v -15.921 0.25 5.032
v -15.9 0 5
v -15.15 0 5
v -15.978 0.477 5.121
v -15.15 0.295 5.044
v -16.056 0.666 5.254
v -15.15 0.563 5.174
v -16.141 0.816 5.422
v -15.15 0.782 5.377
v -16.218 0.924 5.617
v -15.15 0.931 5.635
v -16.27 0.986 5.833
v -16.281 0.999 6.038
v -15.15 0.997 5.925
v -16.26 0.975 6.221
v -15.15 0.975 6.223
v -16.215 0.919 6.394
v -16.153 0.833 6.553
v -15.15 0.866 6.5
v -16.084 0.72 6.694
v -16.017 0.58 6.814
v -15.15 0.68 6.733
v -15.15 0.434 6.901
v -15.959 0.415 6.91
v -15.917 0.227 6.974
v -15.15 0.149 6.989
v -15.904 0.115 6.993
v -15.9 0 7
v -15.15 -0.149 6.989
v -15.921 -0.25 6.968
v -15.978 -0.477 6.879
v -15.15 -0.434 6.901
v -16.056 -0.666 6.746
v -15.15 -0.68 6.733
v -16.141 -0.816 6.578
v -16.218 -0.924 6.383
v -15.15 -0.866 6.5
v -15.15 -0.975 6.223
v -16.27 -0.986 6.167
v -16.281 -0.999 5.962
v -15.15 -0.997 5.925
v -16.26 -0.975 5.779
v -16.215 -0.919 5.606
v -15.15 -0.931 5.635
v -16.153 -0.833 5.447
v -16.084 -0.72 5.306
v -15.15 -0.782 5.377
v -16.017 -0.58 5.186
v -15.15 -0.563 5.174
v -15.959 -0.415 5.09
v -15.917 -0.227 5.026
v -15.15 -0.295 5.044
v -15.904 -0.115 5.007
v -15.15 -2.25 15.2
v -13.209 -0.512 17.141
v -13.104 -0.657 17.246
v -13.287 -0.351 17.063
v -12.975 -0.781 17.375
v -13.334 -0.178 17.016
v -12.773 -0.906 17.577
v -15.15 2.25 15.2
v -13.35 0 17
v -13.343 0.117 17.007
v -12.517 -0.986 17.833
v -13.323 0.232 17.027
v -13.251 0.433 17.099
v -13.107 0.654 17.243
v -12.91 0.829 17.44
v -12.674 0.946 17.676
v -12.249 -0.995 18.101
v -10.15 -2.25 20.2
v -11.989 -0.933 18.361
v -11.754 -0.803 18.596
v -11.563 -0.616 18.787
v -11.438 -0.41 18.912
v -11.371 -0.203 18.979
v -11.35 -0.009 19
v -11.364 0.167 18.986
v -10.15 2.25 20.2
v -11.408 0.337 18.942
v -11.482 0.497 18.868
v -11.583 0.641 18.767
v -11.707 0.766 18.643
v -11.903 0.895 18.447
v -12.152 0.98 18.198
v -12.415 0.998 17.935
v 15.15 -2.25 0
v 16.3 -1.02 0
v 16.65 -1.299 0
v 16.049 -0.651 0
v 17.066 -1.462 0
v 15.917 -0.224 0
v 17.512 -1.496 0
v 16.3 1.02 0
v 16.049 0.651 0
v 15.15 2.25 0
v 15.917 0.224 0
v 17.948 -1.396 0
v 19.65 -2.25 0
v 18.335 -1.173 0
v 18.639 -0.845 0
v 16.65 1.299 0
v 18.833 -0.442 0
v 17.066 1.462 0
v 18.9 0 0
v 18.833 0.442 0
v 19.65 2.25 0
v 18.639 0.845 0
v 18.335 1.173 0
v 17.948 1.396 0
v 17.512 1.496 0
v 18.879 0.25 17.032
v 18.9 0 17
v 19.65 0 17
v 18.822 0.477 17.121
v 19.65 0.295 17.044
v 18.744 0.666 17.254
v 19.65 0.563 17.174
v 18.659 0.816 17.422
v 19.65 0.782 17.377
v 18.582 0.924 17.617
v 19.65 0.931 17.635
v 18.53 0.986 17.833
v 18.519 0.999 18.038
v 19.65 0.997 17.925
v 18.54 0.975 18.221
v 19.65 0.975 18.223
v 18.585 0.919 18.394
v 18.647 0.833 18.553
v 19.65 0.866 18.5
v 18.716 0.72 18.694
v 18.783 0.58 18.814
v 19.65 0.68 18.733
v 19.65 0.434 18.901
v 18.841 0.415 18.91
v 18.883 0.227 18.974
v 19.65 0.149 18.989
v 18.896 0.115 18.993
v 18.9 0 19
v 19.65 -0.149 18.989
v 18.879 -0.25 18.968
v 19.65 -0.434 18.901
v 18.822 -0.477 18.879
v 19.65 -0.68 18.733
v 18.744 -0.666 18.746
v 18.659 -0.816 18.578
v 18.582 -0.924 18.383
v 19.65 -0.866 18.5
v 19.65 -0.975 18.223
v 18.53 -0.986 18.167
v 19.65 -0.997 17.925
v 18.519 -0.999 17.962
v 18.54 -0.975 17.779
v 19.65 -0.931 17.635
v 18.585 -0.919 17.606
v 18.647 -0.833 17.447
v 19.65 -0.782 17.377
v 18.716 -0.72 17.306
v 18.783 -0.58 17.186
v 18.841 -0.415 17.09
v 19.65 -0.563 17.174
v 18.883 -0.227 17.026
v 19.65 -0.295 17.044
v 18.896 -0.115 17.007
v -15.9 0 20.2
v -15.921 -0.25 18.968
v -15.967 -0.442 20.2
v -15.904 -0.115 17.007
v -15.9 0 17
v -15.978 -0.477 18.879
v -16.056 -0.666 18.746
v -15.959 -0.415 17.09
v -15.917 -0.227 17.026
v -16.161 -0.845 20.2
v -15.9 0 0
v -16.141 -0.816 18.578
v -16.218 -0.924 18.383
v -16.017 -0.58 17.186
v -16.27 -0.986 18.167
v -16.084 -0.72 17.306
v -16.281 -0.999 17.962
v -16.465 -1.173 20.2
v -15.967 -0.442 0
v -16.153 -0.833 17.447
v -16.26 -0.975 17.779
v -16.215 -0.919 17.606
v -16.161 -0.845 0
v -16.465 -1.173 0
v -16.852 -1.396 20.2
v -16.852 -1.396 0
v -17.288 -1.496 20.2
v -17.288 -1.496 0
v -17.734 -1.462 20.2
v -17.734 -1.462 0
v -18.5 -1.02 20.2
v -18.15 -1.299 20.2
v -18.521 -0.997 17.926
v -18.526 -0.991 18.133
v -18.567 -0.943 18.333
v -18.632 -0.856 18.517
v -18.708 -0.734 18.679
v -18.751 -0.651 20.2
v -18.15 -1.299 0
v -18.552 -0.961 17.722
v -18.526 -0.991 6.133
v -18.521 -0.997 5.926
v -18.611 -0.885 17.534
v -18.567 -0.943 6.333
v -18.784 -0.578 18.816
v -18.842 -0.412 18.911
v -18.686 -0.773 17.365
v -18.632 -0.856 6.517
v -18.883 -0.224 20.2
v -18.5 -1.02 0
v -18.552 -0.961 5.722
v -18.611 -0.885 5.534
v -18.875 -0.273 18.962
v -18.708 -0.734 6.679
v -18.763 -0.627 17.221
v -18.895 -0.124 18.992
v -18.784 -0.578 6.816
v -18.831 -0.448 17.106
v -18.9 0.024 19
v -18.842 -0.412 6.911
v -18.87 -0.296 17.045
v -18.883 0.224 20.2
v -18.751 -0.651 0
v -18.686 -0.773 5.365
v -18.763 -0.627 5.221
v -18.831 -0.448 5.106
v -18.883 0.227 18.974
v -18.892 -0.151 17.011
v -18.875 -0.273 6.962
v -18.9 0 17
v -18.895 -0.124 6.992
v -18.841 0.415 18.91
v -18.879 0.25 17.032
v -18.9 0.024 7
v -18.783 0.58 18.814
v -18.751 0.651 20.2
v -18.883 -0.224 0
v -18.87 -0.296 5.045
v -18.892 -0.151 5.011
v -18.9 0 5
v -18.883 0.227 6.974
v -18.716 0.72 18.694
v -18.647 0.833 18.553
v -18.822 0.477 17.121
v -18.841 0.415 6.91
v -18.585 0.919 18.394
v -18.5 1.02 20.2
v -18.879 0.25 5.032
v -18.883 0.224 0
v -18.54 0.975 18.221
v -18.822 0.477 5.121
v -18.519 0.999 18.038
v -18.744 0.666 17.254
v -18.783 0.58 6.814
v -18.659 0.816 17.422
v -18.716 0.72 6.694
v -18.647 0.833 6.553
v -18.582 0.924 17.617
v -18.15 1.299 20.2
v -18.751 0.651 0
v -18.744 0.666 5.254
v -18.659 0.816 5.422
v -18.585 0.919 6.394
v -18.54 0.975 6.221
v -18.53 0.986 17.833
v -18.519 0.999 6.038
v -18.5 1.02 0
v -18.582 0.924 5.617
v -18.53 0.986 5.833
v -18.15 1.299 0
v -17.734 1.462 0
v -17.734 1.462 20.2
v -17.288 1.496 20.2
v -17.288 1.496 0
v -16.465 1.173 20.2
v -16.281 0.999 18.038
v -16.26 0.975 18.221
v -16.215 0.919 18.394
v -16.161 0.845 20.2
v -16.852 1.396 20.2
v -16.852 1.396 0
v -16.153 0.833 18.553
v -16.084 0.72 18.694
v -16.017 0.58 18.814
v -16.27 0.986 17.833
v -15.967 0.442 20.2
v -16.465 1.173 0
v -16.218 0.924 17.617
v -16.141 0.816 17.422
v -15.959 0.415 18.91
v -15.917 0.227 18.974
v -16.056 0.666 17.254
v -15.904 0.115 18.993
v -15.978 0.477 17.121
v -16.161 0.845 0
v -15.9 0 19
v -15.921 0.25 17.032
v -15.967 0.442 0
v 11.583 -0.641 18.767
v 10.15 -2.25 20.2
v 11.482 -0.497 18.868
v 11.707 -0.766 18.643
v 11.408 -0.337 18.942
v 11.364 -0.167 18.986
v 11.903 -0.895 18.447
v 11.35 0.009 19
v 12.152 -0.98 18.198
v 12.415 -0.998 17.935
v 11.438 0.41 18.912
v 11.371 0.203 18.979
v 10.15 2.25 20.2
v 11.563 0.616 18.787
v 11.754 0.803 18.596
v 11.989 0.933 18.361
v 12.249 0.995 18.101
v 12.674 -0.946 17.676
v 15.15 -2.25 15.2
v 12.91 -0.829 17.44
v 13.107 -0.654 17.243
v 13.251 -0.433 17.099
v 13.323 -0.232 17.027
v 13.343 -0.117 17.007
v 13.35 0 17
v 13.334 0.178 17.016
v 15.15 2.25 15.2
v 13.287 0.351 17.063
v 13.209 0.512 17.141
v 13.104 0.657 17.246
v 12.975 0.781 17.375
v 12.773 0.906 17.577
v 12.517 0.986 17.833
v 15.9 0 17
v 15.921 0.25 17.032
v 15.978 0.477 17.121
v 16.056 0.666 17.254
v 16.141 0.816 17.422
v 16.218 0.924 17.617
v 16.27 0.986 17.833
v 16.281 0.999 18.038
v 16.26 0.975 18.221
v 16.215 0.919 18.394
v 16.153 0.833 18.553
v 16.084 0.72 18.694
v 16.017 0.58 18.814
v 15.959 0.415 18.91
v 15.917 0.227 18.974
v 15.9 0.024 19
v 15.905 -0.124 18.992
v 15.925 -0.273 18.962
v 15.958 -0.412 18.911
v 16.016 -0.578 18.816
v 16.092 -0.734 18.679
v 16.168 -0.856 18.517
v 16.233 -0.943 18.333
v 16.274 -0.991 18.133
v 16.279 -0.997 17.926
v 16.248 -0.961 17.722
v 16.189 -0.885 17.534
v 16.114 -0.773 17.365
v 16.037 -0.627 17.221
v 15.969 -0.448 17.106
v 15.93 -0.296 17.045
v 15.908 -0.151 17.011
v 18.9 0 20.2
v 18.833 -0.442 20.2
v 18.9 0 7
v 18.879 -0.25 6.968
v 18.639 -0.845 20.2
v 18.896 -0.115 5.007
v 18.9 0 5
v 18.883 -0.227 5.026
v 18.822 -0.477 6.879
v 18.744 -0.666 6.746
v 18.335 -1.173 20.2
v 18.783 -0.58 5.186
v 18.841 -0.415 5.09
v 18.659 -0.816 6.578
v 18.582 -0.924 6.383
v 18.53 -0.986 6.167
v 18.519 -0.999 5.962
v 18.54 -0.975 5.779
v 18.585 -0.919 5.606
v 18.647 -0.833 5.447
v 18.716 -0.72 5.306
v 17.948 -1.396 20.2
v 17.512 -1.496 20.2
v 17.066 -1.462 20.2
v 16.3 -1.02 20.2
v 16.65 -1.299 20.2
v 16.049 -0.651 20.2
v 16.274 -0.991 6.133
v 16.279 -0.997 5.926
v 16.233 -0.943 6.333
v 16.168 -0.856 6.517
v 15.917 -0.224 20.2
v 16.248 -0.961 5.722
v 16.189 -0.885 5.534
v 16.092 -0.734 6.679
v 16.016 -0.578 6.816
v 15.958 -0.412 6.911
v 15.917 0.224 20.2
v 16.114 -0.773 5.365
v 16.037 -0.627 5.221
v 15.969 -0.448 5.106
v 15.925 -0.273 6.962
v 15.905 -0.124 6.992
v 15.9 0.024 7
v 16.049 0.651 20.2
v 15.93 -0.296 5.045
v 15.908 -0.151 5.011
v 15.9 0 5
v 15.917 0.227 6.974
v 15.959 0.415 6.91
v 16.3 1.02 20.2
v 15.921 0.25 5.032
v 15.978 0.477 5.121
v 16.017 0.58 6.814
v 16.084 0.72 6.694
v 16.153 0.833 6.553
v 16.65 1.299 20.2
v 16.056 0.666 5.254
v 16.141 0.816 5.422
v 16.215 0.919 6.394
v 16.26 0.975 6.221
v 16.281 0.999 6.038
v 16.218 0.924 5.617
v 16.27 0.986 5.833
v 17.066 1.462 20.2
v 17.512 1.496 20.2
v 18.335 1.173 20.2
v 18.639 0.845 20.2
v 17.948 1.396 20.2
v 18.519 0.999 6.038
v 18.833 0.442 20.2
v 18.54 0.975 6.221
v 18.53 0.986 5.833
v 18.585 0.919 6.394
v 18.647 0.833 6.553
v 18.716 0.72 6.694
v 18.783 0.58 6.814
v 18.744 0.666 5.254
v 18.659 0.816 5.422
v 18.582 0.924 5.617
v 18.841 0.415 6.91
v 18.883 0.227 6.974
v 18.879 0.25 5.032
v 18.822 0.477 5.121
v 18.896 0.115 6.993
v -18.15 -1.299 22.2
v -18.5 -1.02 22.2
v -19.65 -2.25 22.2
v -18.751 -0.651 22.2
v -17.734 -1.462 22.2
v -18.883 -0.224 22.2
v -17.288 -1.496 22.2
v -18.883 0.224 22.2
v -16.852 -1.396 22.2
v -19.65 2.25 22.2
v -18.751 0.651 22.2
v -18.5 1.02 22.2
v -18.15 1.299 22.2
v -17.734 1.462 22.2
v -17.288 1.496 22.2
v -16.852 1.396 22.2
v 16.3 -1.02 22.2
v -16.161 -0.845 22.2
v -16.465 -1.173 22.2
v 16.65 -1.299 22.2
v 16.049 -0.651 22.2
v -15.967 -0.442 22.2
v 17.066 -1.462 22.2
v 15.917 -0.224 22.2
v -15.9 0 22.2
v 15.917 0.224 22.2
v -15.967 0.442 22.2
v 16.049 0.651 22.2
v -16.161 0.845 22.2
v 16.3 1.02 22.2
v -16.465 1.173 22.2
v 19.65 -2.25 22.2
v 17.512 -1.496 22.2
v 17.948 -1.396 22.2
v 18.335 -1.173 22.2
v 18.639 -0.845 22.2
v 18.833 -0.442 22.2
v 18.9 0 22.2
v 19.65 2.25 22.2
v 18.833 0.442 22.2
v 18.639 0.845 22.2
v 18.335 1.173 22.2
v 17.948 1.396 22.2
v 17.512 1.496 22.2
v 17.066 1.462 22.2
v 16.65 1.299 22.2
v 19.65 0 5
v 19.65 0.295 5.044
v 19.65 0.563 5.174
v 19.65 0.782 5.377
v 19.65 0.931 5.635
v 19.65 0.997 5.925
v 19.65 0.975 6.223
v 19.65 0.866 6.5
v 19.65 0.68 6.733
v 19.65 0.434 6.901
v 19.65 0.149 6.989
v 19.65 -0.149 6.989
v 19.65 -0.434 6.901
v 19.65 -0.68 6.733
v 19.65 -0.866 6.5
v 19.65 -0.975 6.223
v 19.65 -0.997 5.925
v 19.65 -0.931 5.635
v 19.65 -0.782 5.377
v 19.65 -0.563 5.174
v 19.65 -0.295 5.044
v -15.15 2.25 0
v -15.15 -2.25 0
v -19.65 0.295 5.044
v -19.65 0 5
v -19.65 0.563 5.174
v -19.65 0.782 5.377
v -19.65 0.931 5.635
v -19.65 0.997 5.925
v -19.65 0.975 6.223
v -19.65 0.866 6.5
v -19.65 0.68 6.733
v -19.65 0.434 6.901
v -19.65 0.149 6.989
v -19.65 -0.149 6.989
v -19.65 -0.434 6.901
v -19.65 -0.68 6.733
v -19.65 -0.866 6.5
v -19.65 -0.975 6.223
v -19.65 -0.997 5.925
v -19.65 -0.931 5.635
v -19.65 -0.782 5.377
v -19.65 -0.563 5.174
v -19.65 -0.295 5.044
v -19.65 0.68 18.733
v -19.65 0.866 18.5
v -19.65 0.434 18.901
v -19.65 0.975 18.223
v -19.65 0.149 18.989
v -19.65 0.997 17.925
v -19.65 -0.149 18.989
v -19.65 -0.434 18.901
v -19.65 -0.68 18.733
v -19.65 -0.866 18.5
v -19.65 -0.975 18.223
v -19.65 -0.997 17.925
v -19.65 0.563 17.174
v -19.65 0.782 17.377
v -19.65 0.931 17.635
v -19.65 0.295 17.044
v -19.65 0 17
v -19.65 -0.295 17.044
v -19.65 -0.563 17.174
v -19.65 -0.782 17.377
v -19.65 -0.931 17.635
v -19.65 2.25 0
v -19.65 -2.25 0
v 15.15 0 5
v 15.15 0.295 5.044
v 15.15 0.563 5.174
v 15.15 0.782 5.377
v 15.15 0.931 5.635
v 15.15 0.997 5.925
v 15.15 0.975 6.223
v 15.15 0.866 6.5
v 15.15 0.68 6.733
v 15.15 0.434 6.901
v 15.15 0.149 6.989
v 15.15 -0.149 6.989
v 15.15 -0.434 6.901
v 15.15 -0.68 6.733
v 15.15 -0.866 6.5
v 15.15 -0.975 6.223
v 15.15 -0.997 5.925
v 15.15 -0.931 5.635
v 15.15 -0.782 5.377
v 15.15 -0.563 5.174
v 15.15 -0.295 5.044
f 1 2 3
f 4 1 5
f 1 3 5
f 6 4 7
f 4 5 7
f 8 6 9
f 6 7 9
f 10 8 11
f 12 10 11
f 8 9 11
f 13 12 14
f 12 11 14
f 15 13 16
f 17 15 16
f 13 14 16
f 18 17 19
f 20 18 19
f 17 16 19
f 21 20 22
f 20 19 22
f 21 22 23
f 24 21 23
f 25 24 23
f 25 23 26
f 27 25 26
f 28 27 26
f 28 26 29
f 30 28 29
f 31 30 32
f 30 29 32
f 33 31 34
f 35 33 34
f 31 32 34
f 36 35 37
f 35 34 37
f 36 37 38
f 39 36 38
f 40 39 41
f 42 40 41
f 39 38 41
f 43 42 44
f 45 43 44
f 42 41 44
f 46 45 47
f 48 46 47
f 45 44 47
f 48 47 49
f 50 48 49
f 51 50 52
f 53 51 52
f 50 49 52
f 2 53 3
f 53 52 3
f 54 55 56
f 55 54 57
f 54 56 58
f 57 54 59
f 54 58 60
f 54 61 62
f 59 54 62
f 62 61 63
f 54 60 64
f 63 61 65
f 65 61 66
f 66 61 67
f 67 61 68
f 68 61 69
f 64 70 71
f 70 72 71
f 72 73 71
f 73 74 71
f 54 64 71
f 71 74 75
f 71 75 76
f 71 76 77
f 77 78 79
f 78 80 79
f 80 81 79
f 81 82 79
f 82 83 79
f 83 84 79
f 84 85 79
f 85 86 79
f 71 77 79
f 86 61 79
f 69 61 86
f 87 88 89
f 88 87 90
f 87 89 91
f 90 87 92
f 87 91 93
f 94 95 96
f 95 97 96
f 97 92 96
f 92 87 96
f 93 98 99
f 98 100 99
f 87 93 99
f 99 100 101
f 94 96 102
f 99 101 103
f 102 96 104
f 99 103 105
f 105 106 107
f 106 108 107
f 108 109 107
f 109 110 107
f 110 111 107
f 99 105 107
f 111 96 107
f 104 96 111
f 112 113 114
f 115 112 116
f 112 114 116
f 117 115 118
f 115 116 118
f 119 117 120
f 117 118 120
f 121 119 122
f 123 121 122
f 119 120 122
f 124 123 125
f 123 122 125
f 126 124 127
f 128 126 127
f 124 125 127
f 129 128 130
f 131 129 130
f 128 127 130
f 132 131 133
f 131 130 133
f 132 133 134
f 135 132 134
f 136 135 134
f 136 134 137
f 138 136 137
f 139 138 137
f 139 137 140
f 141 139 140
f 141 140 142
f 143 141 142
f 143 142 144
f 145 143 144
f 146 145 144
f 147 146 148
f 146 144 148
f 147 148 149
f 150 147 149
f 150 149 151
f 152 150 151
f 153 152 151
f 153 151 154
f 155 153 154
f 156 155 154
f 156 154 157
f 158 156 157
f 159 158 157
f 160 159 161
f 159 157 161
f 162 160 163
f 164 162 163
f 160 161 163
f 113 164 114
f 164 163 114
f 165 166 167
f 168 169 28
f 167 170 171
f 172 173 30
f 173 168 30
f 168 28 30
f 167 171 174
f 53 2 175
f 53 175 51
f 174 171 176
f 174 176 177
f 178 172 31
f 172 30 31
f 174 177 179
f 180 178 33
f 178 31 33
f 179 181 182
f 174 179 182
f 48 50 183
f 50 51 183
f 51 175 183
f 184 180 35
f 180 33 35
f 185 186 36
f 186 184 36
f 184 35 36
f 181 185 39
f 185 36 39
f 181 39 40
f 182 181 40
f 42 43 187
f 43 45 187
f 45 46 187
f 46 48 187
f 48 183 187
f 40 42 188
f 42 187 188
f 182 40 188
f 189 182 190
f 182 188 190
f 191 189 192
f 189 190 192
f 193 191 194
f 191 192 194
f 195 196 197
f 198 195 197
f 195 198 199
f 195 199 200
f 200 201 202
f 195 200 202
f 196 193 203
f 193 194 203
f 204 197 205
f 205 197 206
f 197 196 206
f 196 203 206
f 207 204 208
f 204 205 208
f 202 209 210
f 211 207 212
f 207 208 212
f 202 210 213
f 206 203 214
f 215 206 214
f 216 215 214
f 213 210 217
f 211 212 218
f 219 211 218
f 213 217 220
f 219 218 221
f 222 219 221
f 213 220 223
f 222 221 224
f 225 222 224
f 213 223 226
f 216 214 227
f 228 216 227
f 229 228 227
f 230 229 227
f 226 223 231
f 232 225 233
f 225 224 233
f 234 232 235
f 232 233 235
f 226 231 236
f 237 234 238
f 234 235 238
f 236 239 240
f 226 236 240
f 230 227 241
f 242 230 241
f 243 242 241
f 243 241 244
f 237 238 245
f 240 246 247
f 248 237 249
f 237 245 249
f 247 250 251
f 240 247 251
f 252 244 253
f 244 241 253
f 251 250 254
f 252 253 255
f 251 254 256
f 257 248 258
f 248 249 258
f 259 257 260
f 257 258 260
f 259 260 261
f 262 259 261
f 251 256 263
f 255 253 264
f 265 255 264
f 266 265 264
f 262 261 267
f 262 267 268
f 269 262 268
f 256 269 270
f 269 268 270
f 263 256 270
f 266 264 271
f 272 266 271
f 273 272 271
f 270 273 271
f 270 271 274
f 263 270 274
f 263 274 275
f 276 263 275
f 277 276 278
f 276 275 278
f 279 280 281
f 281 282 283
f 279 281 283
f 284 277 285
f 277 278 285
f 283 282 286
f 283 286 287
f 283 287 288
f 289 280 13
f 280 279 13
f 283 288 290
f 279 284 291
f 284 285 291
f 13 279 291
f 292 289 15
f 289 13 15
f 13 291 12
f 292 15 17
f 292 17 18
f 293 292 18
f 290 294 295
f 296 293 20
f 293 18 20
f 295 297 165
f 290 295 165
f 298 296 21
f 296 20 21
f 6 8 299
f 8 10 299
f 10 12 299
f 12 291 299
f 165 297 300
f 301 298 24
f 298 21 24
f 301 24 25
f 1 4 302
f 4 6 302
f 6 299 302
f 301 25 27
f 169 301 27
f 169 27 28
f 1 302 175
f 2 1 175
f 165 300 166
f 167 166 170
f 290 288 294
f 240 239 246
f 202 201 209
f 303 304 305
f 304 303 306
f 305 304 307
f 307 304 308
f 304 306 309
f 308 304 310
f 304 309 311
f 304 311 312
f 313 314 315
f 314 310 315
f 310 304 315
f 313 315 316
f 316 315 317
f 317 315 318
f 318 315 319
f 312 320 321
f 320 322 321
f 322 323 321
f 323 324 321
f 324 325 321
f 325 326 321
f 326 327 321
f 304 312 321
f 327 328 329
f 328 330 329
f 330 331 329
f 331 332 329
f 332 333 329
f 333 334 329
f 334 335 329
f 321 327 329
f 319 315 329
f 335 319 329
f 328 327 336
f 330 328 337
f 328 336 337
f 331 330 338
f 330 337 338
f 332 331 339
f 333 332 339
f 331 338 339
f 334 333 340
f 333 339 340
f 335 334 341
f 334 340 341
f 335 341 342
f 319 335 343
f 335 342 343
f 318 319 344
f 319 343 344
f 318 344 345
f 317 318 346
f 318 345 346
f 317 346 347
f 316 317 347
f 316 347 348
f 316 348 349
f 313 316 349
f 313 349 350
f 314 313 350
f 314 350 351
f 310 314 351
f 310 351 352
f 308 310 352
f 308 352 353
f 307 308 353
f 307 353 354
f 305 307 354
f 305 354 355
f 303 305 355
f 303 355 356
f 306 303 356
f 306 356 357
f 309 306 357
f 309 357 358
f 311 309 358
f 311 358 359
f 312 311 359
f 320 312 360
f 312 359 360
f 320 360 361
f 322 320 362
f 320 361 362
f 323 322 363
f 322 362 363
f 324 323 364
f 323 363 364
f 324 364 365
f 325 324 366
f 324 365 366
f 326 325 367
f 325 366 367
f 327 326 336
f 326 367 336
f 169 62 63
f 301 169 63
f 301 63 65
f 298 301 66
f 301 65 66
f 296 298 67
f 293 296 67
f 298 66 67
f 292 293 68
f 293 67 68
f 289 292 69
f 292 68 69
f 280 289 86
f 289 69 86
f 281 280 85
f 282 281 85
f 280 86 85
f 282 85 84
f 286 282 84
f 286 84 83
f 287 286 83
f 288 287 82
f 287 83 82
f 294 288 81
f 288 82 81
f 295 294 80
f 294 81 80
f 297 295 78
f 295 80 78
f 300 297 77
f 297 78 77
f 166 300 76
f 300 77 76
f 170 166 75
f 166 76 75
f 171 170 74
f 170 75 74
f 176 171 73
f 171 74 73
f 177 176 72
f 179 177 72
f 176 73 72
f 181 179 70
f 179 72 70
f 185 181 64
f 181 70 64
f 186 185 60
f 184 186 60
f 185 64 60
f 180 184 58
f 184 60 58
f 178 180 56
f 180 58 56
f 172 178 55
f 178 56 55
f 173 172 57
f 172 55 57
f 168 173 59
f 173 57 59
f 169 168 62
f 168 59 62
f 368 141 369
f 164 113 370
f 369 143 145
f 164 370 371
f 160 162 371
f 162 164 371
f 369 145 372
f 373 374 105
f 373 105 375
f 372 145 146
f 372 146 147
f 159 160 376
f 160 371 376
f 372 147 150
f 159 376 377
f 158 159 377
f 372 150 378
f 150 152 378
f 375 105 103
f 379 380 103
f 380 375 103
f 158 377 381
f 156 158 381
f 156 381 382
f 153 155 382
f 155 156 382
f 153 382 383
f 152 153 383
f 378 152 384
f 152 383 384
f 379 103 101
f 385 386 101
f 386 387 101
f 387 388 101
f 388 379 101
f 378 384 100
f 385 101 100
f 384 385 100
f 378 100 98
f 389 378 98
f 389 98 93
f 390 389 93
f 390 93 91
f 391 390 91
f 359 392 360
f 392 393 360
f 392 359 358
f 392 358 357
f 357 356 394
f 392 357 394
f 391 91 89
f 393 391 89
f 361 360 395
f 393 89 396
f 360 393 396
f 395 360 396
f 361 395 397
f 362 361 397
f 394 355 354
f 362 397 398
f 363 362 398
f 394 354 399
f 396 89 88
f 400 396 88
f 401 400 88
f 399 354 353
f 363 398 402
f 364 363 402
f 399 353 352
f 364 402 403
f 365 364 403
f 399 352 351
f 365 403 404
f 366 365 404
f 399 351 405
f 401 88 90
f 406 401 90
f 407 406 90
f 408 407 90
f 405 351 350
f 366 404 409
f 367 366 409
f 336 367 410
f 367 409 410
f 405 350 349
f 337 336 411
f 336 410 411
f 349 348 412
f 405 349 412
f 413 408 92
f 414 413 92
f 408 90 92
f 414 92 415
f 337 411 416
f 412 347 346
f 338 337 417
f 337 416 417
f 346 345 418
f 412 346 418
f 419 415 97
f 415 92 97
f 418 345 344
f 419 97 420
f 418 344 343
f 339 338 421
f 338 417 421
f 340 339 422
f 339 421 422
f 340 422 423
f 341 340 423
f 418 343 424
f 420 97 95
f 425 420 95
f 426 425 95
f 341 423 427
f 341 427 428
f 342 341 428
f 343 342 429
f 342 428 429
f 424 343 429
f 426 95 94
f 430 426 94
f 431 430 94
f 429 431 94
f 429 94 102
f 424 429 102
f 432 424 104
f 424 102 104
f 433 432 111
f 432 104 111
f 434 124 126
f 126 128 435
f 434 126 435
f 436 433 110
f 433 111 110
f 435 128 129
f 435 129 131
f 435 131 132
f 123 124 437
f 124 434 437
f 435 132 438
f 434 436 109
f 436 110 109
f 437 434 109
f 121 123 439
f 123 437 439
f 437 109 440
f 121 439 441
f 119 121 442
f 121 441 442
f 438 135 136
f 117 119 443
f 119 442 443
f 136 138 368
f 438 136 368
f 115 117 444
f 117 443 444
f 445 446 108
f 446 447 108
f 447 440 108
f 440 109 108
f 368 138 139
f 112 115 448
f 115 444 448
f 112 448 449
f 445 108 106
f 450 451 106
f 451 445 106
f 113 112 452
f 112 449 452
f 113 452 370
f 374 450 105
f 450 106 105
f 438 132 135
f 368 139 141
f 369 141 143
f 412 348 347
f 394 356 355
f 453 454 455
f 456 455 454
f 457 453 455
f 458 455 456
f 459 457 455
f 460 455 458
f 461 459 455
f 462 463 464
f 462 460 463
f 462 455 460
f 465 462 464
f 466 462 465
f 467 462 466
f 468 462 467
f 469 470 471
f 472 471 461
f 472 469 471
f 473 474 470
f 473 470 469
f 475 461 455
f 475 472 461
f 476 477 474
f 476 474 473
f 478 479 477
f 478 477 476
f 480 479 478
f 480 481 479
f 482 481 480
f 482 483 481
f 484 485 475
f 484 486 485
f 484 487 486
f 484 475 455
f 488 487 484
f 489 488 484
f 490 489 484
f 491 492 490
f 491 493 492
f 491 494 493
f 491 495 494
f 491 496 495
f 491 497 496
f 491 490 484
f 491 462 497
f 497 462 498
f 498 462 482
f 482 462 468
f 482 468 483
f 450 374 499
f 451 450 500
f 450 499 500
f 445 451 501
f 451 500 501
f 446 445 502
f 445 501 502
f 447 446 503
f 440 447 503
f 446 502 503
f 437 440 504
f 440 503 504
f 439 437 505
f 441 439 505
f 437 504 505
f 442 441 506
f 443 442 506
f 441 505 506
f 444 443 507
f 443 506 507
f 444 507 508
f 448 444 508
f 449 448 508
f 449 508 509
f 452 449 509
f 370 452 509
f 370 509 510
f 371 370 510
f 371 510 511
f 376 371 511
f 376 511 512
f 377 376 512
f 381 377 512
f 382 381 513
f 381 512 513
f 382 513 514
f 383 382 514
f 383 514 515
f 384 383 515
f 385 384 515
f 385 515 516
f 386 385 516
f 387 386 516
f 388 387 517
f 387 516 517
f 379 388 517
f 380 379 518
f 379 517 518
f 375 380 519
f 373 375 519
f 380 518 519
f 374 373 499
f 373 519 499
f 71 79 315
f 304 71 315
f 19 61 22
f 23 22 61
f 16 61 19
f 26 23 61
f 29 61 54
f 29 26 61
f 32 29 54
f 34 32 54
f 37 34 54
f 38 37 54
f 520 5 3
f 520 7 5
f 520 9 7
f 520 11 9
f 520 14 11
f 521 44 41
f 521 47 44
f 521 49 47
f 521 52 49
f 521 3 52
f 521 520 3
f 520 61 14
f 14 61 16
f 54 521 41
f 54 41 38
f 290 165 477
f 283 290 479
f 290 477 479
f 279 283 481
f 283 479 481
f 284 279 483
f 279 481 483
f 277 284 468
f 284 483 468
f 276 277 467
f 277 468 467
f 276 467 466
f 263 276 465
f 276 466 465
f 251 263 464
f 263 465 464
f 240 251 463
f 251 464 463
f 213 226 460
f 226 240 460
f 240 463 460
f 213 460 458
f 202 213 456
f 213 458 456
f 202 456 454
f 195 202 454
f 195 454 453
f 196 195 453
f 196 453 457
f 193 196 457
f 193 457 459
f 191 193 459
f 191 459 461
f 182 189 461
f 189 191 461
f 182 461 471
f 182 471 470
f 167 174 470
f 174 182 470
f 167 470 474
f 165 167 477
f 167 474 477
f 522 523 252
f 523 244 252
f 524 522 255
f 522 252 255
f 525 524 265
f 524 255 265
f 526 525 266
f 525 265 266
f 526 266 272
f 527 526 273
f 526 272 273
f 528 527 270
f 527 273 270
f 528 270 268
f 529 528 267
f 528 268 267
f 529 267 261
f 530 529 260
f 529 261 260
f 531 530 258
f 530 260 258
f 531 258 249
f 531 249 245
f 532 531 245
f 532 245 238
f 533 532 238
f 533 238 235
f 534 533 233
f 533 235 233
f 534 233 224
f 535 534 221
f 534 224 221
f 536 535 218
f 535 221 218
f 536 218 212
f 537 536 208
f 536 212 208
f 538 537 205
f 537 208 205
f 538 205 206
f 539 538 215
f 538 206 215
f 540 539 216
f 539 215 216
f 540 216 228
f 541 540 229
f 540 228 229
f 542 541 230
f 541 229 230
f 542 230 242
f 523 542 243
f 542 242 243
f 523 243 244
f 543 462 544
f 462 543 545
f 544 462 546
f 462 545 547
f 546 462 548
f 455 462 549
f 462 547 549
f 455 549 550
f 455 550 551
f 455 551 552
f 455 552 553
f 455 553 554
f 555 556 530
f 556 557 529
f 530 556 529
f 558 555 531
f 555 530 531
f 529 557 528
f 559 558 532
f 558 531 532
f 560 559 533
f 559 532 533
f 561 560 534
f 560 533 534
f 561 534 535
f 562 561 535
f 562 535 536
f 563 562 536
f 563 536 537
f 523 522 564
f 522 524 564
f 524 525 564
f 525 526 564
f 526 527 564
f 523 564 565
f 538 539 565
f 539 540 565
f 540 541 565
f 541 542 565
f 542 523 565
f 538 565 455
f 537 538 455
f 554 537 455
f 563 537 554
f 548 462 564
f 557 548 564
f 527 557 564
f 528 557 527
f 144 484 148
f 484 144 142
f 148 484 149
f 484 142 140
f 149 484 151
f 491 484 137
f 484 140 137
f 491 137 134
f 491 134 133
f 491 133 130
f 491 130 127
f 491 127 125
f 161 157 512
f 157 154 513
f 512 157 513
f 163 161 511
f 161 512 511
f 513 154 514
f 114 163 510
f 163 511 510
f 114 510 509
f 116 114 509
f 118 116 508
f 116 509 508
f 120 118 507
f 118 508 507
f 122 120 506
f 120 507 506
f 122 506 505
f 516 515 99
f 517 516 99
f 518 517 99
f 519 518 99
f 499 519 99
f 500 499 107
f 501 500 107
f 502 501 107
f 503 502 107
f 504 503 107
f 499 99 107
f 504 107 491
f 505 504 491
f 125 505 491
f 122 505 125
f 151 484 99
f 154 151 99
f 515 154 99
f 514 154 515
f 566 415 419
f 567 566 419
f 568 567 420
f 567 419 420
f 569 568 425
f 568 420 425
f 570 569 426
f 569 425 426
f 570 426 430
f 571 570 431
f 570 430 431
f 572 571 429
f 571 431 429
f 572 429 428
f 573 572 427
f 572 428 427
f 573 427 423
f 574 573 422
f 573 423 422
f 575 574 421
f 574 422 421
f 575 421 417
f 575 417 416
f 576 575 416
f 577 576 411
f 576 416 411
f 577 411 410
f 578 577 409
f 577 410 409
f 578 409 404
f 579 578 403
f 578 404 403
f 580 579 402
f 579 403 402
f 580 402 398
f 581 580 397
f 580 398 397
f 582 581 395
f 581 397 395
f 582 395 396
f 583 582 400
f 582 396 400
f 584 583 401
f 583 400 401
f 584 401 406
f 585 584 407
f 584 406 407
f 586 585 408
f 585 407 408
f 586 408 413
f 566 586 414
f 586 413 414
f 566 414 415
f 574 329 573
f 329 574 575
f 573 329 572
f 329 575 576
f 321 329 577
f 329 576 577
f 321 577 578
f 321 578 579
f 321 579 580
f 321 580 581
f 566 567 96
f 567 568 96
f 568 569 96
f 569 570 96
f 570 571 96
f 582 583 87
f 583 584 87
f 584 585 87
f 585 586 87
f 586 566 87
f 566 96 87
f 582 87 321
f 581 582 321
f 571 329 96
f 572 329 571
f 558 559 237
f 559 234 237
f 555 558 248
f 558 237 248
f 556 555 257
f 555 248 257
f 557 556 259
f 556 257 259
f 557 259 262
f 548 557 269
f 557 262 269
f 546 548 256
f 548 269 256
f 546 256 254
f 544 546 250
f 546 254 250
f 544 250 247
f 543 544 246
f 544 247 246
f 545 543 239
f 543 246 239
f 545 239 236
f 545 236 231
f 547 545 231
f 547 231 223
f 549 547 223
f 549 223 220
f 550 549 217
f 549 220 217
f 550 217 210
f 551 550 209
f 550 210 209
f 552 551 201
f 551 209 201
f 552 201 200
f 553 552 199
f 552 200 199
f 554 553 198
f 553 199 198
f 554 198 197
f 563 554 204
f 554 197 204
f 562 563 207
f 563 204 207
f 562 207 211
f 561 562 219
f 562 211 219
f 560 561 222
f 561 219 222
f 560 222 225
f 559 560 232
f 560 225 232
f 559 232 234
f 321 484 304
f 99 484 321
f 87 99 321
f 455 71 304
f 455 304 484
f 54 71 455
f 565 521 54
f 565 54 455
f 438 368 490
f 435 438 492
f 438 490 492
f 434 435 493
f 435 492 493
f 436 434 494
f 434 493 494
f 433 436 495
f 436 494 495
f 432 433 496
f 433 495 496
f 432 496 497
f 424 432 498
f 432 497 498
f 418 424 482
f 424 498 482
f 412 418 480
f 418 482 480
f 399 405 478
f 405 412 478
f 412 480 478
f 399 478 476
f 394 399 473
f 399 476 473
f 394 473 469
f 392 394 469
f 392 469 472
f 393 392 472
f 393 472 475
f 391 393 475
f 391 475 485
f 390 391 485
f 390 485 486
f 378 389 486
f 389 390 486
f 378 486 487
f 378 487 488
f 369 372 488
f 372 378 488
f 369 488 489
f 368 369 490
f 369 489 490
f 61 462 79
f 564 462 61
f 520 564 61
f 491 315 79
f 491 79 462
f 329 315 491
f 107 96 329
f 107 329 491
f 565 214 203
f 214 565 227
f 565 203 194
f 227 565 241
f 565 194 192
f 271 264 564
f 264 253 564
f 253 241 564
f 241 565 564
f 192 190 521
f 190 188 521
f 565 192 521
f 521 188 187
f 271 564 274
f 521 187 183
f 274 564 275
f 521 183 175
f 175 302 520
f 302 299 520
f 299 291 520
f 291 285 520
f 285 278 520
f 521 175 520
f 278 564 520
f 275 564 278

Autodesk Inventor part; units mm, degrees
ref_plane "YZ Plane" through (0, 0, 0) normal (1, 0, 0) x (0, 1, 0)
sketch "Sketch1" plane through (0, 0, 0) normal (0, 0, 1) x (1, 0, 0)
  circle A0 centre (-17.4, 0) radius 1.5
  line L0 (0, 7.9375) -> (0, -7.1814) construction
  line L1 (-8.2631, 0) -> (10.6068, 0) construction
  line L2 (-19.65, 2.25) -> (-15.15, 2.25)
  line L3 (-15.15, 2.25) -> (-15.15, -2.25)
  line L4 (-15.15, -2.25) -> (-19.65, -2.25)
  line L5 (-19.65, -2.25) -> (-19.65, 2.25)
  line L6 (-19.65, 2.25) -> (-15.15, -2.25) construction
  line L7 (-15.15, 2.25) -> (-19.65, -2.25) construction
  circle A1 centre (17.4, 0) radius 1.5
  line L8 (19.65, 2.25) -> (15.15, 2.25)
  line L9 (15.15, 2.25) -> (15.15, -2.25)
  line L10 (15.15, -2.25) -> (19.65, -2.25)
  line L11 (19.65, -2.25) -> (19.65, 2.25)
  line L12 (19.65, 2.25) -> (15.15, -2.25) construction
  line L13 (15.15, 2.25) -> (19.65, -2.25) construction
  point P0 (0, 0)
  dimension "d0" = 3
  dimension "d1" = 17.4
  dimension "d2" = 4.5
  dimension "d3" = 4.5
extrude "Extrusion1" add sketch "Sketch1" along normal blind 20.2 contours A0 | L2 L3 L4 L5 | A1 | L11 L10 L9 L8
extrude "Extrusion2" cut sketch "Sketch1" along normal blind 22.2 contours A0 | A1
ref_plane "Work Plane1" through (19.65, 0, 20.2) normal (0, 0, 1) x (1, 0, 0)
sketch "Sketch2" plane through (19.65, 0, 20.2) normal (0, 0, 1) x (1, 0, 0)
  line L0 (-39.3, 2.25) -> (-39.3, -2.25) projected
  line L1 (0, -2.25) -> (0, 2.25) projected
  line L2 (-39.3, 2.25) -> (0, 2.25)
  line L3 (0, 2.25) -> (0, -2.25)
  line L4 (0, -2.25) -> (-39.3, -2.25)
  line L5 (-39.3, -2.25) -> (-39.3, 2.25)
  point P0 (-19.65, 0)
extrude "Extrusion3" add sketch "Sketch2" along normal blind 2
ref_plane "Work Plane2" through (15.15, 0, 0) normal (0, -1, 0) x (1, 0, 0)
sketch "Sketch5" plane through (15.15, 0, 0) normal (0, -1, 0) x (1, 0, 0)
  line L0 (0, 20.2) -> (-30.3, 20.2) projected
  line L1 (-30.3, 20.2) -> (-25.3, 20.2)
  line L2 (-30.3, 20.2) -> (-30.3, 15.2)
  line L3 (-30.3, 0) -> (-30.3, 20.2) projected
  line L4 (-30.3, 15.2) -> (-25.3, 20.2)
  line L5 (0, 0) -> (0, 20.2) projected
  line L6 (0, 20.2) -> (-5, 20.2)
  line L7 (-5, 20.2) -> (0, 15.2)
  line L8 (0, 15.2) -> (0, 20.2)
  point P0 (-15.15, 0)
  dimension "d10" = 5
  dimension "d11" = 5
  dimension "d12" = 5
extrude "Extrusion4" add sketch "Sketch5" along normal mid plane 4.5
sketch "Sketch6" plane through (19.65, 0, 22.2) normal (0, 0, 1) x (1, 0, 0)
  circle A0 centre (-37.05, 0) radius 1.5 projected
  circle A1 centre (-37.05, 0) radius 1.5
  circle A2 centre (-2.25, 0) radius 1.5 projected
  circle A3 centre (-2.25, 0) radius 1.5
  point P0 (-19.65, 0)
extrude "Extrusion5" cut sketch "Sketch6" against normal blind 2
thread "Thread1" size "M3x0.5" class "6H" standard "ANSI Metric M Profile" full length
thread "Thread2" size "M3x0.5" class "6H" standard "ANSI Metric M Profile" full length
sketch "Sketch7" plane through (19.65, -2.25, 0) normal (1, 0, 0) x (0, 0, -1)
  circle A0 centre (-6, 2.25) radius 1
  line L0 (0, 0) -> (0, 4.5) projected
  circle A1 centre (-18, 2.25) radius 1
  point P0 (0, 2.25)
  point P1 (0, 2.25)
  dimension "d21" = 2
  dimension "d22" = 6
  dimension "d23" = 2
  dimension "d24" = 12
extrude "Extrusion6" cut sketch "Sketch7" against normal blind 40
properties part number "Tiang 1_3DPrint"
